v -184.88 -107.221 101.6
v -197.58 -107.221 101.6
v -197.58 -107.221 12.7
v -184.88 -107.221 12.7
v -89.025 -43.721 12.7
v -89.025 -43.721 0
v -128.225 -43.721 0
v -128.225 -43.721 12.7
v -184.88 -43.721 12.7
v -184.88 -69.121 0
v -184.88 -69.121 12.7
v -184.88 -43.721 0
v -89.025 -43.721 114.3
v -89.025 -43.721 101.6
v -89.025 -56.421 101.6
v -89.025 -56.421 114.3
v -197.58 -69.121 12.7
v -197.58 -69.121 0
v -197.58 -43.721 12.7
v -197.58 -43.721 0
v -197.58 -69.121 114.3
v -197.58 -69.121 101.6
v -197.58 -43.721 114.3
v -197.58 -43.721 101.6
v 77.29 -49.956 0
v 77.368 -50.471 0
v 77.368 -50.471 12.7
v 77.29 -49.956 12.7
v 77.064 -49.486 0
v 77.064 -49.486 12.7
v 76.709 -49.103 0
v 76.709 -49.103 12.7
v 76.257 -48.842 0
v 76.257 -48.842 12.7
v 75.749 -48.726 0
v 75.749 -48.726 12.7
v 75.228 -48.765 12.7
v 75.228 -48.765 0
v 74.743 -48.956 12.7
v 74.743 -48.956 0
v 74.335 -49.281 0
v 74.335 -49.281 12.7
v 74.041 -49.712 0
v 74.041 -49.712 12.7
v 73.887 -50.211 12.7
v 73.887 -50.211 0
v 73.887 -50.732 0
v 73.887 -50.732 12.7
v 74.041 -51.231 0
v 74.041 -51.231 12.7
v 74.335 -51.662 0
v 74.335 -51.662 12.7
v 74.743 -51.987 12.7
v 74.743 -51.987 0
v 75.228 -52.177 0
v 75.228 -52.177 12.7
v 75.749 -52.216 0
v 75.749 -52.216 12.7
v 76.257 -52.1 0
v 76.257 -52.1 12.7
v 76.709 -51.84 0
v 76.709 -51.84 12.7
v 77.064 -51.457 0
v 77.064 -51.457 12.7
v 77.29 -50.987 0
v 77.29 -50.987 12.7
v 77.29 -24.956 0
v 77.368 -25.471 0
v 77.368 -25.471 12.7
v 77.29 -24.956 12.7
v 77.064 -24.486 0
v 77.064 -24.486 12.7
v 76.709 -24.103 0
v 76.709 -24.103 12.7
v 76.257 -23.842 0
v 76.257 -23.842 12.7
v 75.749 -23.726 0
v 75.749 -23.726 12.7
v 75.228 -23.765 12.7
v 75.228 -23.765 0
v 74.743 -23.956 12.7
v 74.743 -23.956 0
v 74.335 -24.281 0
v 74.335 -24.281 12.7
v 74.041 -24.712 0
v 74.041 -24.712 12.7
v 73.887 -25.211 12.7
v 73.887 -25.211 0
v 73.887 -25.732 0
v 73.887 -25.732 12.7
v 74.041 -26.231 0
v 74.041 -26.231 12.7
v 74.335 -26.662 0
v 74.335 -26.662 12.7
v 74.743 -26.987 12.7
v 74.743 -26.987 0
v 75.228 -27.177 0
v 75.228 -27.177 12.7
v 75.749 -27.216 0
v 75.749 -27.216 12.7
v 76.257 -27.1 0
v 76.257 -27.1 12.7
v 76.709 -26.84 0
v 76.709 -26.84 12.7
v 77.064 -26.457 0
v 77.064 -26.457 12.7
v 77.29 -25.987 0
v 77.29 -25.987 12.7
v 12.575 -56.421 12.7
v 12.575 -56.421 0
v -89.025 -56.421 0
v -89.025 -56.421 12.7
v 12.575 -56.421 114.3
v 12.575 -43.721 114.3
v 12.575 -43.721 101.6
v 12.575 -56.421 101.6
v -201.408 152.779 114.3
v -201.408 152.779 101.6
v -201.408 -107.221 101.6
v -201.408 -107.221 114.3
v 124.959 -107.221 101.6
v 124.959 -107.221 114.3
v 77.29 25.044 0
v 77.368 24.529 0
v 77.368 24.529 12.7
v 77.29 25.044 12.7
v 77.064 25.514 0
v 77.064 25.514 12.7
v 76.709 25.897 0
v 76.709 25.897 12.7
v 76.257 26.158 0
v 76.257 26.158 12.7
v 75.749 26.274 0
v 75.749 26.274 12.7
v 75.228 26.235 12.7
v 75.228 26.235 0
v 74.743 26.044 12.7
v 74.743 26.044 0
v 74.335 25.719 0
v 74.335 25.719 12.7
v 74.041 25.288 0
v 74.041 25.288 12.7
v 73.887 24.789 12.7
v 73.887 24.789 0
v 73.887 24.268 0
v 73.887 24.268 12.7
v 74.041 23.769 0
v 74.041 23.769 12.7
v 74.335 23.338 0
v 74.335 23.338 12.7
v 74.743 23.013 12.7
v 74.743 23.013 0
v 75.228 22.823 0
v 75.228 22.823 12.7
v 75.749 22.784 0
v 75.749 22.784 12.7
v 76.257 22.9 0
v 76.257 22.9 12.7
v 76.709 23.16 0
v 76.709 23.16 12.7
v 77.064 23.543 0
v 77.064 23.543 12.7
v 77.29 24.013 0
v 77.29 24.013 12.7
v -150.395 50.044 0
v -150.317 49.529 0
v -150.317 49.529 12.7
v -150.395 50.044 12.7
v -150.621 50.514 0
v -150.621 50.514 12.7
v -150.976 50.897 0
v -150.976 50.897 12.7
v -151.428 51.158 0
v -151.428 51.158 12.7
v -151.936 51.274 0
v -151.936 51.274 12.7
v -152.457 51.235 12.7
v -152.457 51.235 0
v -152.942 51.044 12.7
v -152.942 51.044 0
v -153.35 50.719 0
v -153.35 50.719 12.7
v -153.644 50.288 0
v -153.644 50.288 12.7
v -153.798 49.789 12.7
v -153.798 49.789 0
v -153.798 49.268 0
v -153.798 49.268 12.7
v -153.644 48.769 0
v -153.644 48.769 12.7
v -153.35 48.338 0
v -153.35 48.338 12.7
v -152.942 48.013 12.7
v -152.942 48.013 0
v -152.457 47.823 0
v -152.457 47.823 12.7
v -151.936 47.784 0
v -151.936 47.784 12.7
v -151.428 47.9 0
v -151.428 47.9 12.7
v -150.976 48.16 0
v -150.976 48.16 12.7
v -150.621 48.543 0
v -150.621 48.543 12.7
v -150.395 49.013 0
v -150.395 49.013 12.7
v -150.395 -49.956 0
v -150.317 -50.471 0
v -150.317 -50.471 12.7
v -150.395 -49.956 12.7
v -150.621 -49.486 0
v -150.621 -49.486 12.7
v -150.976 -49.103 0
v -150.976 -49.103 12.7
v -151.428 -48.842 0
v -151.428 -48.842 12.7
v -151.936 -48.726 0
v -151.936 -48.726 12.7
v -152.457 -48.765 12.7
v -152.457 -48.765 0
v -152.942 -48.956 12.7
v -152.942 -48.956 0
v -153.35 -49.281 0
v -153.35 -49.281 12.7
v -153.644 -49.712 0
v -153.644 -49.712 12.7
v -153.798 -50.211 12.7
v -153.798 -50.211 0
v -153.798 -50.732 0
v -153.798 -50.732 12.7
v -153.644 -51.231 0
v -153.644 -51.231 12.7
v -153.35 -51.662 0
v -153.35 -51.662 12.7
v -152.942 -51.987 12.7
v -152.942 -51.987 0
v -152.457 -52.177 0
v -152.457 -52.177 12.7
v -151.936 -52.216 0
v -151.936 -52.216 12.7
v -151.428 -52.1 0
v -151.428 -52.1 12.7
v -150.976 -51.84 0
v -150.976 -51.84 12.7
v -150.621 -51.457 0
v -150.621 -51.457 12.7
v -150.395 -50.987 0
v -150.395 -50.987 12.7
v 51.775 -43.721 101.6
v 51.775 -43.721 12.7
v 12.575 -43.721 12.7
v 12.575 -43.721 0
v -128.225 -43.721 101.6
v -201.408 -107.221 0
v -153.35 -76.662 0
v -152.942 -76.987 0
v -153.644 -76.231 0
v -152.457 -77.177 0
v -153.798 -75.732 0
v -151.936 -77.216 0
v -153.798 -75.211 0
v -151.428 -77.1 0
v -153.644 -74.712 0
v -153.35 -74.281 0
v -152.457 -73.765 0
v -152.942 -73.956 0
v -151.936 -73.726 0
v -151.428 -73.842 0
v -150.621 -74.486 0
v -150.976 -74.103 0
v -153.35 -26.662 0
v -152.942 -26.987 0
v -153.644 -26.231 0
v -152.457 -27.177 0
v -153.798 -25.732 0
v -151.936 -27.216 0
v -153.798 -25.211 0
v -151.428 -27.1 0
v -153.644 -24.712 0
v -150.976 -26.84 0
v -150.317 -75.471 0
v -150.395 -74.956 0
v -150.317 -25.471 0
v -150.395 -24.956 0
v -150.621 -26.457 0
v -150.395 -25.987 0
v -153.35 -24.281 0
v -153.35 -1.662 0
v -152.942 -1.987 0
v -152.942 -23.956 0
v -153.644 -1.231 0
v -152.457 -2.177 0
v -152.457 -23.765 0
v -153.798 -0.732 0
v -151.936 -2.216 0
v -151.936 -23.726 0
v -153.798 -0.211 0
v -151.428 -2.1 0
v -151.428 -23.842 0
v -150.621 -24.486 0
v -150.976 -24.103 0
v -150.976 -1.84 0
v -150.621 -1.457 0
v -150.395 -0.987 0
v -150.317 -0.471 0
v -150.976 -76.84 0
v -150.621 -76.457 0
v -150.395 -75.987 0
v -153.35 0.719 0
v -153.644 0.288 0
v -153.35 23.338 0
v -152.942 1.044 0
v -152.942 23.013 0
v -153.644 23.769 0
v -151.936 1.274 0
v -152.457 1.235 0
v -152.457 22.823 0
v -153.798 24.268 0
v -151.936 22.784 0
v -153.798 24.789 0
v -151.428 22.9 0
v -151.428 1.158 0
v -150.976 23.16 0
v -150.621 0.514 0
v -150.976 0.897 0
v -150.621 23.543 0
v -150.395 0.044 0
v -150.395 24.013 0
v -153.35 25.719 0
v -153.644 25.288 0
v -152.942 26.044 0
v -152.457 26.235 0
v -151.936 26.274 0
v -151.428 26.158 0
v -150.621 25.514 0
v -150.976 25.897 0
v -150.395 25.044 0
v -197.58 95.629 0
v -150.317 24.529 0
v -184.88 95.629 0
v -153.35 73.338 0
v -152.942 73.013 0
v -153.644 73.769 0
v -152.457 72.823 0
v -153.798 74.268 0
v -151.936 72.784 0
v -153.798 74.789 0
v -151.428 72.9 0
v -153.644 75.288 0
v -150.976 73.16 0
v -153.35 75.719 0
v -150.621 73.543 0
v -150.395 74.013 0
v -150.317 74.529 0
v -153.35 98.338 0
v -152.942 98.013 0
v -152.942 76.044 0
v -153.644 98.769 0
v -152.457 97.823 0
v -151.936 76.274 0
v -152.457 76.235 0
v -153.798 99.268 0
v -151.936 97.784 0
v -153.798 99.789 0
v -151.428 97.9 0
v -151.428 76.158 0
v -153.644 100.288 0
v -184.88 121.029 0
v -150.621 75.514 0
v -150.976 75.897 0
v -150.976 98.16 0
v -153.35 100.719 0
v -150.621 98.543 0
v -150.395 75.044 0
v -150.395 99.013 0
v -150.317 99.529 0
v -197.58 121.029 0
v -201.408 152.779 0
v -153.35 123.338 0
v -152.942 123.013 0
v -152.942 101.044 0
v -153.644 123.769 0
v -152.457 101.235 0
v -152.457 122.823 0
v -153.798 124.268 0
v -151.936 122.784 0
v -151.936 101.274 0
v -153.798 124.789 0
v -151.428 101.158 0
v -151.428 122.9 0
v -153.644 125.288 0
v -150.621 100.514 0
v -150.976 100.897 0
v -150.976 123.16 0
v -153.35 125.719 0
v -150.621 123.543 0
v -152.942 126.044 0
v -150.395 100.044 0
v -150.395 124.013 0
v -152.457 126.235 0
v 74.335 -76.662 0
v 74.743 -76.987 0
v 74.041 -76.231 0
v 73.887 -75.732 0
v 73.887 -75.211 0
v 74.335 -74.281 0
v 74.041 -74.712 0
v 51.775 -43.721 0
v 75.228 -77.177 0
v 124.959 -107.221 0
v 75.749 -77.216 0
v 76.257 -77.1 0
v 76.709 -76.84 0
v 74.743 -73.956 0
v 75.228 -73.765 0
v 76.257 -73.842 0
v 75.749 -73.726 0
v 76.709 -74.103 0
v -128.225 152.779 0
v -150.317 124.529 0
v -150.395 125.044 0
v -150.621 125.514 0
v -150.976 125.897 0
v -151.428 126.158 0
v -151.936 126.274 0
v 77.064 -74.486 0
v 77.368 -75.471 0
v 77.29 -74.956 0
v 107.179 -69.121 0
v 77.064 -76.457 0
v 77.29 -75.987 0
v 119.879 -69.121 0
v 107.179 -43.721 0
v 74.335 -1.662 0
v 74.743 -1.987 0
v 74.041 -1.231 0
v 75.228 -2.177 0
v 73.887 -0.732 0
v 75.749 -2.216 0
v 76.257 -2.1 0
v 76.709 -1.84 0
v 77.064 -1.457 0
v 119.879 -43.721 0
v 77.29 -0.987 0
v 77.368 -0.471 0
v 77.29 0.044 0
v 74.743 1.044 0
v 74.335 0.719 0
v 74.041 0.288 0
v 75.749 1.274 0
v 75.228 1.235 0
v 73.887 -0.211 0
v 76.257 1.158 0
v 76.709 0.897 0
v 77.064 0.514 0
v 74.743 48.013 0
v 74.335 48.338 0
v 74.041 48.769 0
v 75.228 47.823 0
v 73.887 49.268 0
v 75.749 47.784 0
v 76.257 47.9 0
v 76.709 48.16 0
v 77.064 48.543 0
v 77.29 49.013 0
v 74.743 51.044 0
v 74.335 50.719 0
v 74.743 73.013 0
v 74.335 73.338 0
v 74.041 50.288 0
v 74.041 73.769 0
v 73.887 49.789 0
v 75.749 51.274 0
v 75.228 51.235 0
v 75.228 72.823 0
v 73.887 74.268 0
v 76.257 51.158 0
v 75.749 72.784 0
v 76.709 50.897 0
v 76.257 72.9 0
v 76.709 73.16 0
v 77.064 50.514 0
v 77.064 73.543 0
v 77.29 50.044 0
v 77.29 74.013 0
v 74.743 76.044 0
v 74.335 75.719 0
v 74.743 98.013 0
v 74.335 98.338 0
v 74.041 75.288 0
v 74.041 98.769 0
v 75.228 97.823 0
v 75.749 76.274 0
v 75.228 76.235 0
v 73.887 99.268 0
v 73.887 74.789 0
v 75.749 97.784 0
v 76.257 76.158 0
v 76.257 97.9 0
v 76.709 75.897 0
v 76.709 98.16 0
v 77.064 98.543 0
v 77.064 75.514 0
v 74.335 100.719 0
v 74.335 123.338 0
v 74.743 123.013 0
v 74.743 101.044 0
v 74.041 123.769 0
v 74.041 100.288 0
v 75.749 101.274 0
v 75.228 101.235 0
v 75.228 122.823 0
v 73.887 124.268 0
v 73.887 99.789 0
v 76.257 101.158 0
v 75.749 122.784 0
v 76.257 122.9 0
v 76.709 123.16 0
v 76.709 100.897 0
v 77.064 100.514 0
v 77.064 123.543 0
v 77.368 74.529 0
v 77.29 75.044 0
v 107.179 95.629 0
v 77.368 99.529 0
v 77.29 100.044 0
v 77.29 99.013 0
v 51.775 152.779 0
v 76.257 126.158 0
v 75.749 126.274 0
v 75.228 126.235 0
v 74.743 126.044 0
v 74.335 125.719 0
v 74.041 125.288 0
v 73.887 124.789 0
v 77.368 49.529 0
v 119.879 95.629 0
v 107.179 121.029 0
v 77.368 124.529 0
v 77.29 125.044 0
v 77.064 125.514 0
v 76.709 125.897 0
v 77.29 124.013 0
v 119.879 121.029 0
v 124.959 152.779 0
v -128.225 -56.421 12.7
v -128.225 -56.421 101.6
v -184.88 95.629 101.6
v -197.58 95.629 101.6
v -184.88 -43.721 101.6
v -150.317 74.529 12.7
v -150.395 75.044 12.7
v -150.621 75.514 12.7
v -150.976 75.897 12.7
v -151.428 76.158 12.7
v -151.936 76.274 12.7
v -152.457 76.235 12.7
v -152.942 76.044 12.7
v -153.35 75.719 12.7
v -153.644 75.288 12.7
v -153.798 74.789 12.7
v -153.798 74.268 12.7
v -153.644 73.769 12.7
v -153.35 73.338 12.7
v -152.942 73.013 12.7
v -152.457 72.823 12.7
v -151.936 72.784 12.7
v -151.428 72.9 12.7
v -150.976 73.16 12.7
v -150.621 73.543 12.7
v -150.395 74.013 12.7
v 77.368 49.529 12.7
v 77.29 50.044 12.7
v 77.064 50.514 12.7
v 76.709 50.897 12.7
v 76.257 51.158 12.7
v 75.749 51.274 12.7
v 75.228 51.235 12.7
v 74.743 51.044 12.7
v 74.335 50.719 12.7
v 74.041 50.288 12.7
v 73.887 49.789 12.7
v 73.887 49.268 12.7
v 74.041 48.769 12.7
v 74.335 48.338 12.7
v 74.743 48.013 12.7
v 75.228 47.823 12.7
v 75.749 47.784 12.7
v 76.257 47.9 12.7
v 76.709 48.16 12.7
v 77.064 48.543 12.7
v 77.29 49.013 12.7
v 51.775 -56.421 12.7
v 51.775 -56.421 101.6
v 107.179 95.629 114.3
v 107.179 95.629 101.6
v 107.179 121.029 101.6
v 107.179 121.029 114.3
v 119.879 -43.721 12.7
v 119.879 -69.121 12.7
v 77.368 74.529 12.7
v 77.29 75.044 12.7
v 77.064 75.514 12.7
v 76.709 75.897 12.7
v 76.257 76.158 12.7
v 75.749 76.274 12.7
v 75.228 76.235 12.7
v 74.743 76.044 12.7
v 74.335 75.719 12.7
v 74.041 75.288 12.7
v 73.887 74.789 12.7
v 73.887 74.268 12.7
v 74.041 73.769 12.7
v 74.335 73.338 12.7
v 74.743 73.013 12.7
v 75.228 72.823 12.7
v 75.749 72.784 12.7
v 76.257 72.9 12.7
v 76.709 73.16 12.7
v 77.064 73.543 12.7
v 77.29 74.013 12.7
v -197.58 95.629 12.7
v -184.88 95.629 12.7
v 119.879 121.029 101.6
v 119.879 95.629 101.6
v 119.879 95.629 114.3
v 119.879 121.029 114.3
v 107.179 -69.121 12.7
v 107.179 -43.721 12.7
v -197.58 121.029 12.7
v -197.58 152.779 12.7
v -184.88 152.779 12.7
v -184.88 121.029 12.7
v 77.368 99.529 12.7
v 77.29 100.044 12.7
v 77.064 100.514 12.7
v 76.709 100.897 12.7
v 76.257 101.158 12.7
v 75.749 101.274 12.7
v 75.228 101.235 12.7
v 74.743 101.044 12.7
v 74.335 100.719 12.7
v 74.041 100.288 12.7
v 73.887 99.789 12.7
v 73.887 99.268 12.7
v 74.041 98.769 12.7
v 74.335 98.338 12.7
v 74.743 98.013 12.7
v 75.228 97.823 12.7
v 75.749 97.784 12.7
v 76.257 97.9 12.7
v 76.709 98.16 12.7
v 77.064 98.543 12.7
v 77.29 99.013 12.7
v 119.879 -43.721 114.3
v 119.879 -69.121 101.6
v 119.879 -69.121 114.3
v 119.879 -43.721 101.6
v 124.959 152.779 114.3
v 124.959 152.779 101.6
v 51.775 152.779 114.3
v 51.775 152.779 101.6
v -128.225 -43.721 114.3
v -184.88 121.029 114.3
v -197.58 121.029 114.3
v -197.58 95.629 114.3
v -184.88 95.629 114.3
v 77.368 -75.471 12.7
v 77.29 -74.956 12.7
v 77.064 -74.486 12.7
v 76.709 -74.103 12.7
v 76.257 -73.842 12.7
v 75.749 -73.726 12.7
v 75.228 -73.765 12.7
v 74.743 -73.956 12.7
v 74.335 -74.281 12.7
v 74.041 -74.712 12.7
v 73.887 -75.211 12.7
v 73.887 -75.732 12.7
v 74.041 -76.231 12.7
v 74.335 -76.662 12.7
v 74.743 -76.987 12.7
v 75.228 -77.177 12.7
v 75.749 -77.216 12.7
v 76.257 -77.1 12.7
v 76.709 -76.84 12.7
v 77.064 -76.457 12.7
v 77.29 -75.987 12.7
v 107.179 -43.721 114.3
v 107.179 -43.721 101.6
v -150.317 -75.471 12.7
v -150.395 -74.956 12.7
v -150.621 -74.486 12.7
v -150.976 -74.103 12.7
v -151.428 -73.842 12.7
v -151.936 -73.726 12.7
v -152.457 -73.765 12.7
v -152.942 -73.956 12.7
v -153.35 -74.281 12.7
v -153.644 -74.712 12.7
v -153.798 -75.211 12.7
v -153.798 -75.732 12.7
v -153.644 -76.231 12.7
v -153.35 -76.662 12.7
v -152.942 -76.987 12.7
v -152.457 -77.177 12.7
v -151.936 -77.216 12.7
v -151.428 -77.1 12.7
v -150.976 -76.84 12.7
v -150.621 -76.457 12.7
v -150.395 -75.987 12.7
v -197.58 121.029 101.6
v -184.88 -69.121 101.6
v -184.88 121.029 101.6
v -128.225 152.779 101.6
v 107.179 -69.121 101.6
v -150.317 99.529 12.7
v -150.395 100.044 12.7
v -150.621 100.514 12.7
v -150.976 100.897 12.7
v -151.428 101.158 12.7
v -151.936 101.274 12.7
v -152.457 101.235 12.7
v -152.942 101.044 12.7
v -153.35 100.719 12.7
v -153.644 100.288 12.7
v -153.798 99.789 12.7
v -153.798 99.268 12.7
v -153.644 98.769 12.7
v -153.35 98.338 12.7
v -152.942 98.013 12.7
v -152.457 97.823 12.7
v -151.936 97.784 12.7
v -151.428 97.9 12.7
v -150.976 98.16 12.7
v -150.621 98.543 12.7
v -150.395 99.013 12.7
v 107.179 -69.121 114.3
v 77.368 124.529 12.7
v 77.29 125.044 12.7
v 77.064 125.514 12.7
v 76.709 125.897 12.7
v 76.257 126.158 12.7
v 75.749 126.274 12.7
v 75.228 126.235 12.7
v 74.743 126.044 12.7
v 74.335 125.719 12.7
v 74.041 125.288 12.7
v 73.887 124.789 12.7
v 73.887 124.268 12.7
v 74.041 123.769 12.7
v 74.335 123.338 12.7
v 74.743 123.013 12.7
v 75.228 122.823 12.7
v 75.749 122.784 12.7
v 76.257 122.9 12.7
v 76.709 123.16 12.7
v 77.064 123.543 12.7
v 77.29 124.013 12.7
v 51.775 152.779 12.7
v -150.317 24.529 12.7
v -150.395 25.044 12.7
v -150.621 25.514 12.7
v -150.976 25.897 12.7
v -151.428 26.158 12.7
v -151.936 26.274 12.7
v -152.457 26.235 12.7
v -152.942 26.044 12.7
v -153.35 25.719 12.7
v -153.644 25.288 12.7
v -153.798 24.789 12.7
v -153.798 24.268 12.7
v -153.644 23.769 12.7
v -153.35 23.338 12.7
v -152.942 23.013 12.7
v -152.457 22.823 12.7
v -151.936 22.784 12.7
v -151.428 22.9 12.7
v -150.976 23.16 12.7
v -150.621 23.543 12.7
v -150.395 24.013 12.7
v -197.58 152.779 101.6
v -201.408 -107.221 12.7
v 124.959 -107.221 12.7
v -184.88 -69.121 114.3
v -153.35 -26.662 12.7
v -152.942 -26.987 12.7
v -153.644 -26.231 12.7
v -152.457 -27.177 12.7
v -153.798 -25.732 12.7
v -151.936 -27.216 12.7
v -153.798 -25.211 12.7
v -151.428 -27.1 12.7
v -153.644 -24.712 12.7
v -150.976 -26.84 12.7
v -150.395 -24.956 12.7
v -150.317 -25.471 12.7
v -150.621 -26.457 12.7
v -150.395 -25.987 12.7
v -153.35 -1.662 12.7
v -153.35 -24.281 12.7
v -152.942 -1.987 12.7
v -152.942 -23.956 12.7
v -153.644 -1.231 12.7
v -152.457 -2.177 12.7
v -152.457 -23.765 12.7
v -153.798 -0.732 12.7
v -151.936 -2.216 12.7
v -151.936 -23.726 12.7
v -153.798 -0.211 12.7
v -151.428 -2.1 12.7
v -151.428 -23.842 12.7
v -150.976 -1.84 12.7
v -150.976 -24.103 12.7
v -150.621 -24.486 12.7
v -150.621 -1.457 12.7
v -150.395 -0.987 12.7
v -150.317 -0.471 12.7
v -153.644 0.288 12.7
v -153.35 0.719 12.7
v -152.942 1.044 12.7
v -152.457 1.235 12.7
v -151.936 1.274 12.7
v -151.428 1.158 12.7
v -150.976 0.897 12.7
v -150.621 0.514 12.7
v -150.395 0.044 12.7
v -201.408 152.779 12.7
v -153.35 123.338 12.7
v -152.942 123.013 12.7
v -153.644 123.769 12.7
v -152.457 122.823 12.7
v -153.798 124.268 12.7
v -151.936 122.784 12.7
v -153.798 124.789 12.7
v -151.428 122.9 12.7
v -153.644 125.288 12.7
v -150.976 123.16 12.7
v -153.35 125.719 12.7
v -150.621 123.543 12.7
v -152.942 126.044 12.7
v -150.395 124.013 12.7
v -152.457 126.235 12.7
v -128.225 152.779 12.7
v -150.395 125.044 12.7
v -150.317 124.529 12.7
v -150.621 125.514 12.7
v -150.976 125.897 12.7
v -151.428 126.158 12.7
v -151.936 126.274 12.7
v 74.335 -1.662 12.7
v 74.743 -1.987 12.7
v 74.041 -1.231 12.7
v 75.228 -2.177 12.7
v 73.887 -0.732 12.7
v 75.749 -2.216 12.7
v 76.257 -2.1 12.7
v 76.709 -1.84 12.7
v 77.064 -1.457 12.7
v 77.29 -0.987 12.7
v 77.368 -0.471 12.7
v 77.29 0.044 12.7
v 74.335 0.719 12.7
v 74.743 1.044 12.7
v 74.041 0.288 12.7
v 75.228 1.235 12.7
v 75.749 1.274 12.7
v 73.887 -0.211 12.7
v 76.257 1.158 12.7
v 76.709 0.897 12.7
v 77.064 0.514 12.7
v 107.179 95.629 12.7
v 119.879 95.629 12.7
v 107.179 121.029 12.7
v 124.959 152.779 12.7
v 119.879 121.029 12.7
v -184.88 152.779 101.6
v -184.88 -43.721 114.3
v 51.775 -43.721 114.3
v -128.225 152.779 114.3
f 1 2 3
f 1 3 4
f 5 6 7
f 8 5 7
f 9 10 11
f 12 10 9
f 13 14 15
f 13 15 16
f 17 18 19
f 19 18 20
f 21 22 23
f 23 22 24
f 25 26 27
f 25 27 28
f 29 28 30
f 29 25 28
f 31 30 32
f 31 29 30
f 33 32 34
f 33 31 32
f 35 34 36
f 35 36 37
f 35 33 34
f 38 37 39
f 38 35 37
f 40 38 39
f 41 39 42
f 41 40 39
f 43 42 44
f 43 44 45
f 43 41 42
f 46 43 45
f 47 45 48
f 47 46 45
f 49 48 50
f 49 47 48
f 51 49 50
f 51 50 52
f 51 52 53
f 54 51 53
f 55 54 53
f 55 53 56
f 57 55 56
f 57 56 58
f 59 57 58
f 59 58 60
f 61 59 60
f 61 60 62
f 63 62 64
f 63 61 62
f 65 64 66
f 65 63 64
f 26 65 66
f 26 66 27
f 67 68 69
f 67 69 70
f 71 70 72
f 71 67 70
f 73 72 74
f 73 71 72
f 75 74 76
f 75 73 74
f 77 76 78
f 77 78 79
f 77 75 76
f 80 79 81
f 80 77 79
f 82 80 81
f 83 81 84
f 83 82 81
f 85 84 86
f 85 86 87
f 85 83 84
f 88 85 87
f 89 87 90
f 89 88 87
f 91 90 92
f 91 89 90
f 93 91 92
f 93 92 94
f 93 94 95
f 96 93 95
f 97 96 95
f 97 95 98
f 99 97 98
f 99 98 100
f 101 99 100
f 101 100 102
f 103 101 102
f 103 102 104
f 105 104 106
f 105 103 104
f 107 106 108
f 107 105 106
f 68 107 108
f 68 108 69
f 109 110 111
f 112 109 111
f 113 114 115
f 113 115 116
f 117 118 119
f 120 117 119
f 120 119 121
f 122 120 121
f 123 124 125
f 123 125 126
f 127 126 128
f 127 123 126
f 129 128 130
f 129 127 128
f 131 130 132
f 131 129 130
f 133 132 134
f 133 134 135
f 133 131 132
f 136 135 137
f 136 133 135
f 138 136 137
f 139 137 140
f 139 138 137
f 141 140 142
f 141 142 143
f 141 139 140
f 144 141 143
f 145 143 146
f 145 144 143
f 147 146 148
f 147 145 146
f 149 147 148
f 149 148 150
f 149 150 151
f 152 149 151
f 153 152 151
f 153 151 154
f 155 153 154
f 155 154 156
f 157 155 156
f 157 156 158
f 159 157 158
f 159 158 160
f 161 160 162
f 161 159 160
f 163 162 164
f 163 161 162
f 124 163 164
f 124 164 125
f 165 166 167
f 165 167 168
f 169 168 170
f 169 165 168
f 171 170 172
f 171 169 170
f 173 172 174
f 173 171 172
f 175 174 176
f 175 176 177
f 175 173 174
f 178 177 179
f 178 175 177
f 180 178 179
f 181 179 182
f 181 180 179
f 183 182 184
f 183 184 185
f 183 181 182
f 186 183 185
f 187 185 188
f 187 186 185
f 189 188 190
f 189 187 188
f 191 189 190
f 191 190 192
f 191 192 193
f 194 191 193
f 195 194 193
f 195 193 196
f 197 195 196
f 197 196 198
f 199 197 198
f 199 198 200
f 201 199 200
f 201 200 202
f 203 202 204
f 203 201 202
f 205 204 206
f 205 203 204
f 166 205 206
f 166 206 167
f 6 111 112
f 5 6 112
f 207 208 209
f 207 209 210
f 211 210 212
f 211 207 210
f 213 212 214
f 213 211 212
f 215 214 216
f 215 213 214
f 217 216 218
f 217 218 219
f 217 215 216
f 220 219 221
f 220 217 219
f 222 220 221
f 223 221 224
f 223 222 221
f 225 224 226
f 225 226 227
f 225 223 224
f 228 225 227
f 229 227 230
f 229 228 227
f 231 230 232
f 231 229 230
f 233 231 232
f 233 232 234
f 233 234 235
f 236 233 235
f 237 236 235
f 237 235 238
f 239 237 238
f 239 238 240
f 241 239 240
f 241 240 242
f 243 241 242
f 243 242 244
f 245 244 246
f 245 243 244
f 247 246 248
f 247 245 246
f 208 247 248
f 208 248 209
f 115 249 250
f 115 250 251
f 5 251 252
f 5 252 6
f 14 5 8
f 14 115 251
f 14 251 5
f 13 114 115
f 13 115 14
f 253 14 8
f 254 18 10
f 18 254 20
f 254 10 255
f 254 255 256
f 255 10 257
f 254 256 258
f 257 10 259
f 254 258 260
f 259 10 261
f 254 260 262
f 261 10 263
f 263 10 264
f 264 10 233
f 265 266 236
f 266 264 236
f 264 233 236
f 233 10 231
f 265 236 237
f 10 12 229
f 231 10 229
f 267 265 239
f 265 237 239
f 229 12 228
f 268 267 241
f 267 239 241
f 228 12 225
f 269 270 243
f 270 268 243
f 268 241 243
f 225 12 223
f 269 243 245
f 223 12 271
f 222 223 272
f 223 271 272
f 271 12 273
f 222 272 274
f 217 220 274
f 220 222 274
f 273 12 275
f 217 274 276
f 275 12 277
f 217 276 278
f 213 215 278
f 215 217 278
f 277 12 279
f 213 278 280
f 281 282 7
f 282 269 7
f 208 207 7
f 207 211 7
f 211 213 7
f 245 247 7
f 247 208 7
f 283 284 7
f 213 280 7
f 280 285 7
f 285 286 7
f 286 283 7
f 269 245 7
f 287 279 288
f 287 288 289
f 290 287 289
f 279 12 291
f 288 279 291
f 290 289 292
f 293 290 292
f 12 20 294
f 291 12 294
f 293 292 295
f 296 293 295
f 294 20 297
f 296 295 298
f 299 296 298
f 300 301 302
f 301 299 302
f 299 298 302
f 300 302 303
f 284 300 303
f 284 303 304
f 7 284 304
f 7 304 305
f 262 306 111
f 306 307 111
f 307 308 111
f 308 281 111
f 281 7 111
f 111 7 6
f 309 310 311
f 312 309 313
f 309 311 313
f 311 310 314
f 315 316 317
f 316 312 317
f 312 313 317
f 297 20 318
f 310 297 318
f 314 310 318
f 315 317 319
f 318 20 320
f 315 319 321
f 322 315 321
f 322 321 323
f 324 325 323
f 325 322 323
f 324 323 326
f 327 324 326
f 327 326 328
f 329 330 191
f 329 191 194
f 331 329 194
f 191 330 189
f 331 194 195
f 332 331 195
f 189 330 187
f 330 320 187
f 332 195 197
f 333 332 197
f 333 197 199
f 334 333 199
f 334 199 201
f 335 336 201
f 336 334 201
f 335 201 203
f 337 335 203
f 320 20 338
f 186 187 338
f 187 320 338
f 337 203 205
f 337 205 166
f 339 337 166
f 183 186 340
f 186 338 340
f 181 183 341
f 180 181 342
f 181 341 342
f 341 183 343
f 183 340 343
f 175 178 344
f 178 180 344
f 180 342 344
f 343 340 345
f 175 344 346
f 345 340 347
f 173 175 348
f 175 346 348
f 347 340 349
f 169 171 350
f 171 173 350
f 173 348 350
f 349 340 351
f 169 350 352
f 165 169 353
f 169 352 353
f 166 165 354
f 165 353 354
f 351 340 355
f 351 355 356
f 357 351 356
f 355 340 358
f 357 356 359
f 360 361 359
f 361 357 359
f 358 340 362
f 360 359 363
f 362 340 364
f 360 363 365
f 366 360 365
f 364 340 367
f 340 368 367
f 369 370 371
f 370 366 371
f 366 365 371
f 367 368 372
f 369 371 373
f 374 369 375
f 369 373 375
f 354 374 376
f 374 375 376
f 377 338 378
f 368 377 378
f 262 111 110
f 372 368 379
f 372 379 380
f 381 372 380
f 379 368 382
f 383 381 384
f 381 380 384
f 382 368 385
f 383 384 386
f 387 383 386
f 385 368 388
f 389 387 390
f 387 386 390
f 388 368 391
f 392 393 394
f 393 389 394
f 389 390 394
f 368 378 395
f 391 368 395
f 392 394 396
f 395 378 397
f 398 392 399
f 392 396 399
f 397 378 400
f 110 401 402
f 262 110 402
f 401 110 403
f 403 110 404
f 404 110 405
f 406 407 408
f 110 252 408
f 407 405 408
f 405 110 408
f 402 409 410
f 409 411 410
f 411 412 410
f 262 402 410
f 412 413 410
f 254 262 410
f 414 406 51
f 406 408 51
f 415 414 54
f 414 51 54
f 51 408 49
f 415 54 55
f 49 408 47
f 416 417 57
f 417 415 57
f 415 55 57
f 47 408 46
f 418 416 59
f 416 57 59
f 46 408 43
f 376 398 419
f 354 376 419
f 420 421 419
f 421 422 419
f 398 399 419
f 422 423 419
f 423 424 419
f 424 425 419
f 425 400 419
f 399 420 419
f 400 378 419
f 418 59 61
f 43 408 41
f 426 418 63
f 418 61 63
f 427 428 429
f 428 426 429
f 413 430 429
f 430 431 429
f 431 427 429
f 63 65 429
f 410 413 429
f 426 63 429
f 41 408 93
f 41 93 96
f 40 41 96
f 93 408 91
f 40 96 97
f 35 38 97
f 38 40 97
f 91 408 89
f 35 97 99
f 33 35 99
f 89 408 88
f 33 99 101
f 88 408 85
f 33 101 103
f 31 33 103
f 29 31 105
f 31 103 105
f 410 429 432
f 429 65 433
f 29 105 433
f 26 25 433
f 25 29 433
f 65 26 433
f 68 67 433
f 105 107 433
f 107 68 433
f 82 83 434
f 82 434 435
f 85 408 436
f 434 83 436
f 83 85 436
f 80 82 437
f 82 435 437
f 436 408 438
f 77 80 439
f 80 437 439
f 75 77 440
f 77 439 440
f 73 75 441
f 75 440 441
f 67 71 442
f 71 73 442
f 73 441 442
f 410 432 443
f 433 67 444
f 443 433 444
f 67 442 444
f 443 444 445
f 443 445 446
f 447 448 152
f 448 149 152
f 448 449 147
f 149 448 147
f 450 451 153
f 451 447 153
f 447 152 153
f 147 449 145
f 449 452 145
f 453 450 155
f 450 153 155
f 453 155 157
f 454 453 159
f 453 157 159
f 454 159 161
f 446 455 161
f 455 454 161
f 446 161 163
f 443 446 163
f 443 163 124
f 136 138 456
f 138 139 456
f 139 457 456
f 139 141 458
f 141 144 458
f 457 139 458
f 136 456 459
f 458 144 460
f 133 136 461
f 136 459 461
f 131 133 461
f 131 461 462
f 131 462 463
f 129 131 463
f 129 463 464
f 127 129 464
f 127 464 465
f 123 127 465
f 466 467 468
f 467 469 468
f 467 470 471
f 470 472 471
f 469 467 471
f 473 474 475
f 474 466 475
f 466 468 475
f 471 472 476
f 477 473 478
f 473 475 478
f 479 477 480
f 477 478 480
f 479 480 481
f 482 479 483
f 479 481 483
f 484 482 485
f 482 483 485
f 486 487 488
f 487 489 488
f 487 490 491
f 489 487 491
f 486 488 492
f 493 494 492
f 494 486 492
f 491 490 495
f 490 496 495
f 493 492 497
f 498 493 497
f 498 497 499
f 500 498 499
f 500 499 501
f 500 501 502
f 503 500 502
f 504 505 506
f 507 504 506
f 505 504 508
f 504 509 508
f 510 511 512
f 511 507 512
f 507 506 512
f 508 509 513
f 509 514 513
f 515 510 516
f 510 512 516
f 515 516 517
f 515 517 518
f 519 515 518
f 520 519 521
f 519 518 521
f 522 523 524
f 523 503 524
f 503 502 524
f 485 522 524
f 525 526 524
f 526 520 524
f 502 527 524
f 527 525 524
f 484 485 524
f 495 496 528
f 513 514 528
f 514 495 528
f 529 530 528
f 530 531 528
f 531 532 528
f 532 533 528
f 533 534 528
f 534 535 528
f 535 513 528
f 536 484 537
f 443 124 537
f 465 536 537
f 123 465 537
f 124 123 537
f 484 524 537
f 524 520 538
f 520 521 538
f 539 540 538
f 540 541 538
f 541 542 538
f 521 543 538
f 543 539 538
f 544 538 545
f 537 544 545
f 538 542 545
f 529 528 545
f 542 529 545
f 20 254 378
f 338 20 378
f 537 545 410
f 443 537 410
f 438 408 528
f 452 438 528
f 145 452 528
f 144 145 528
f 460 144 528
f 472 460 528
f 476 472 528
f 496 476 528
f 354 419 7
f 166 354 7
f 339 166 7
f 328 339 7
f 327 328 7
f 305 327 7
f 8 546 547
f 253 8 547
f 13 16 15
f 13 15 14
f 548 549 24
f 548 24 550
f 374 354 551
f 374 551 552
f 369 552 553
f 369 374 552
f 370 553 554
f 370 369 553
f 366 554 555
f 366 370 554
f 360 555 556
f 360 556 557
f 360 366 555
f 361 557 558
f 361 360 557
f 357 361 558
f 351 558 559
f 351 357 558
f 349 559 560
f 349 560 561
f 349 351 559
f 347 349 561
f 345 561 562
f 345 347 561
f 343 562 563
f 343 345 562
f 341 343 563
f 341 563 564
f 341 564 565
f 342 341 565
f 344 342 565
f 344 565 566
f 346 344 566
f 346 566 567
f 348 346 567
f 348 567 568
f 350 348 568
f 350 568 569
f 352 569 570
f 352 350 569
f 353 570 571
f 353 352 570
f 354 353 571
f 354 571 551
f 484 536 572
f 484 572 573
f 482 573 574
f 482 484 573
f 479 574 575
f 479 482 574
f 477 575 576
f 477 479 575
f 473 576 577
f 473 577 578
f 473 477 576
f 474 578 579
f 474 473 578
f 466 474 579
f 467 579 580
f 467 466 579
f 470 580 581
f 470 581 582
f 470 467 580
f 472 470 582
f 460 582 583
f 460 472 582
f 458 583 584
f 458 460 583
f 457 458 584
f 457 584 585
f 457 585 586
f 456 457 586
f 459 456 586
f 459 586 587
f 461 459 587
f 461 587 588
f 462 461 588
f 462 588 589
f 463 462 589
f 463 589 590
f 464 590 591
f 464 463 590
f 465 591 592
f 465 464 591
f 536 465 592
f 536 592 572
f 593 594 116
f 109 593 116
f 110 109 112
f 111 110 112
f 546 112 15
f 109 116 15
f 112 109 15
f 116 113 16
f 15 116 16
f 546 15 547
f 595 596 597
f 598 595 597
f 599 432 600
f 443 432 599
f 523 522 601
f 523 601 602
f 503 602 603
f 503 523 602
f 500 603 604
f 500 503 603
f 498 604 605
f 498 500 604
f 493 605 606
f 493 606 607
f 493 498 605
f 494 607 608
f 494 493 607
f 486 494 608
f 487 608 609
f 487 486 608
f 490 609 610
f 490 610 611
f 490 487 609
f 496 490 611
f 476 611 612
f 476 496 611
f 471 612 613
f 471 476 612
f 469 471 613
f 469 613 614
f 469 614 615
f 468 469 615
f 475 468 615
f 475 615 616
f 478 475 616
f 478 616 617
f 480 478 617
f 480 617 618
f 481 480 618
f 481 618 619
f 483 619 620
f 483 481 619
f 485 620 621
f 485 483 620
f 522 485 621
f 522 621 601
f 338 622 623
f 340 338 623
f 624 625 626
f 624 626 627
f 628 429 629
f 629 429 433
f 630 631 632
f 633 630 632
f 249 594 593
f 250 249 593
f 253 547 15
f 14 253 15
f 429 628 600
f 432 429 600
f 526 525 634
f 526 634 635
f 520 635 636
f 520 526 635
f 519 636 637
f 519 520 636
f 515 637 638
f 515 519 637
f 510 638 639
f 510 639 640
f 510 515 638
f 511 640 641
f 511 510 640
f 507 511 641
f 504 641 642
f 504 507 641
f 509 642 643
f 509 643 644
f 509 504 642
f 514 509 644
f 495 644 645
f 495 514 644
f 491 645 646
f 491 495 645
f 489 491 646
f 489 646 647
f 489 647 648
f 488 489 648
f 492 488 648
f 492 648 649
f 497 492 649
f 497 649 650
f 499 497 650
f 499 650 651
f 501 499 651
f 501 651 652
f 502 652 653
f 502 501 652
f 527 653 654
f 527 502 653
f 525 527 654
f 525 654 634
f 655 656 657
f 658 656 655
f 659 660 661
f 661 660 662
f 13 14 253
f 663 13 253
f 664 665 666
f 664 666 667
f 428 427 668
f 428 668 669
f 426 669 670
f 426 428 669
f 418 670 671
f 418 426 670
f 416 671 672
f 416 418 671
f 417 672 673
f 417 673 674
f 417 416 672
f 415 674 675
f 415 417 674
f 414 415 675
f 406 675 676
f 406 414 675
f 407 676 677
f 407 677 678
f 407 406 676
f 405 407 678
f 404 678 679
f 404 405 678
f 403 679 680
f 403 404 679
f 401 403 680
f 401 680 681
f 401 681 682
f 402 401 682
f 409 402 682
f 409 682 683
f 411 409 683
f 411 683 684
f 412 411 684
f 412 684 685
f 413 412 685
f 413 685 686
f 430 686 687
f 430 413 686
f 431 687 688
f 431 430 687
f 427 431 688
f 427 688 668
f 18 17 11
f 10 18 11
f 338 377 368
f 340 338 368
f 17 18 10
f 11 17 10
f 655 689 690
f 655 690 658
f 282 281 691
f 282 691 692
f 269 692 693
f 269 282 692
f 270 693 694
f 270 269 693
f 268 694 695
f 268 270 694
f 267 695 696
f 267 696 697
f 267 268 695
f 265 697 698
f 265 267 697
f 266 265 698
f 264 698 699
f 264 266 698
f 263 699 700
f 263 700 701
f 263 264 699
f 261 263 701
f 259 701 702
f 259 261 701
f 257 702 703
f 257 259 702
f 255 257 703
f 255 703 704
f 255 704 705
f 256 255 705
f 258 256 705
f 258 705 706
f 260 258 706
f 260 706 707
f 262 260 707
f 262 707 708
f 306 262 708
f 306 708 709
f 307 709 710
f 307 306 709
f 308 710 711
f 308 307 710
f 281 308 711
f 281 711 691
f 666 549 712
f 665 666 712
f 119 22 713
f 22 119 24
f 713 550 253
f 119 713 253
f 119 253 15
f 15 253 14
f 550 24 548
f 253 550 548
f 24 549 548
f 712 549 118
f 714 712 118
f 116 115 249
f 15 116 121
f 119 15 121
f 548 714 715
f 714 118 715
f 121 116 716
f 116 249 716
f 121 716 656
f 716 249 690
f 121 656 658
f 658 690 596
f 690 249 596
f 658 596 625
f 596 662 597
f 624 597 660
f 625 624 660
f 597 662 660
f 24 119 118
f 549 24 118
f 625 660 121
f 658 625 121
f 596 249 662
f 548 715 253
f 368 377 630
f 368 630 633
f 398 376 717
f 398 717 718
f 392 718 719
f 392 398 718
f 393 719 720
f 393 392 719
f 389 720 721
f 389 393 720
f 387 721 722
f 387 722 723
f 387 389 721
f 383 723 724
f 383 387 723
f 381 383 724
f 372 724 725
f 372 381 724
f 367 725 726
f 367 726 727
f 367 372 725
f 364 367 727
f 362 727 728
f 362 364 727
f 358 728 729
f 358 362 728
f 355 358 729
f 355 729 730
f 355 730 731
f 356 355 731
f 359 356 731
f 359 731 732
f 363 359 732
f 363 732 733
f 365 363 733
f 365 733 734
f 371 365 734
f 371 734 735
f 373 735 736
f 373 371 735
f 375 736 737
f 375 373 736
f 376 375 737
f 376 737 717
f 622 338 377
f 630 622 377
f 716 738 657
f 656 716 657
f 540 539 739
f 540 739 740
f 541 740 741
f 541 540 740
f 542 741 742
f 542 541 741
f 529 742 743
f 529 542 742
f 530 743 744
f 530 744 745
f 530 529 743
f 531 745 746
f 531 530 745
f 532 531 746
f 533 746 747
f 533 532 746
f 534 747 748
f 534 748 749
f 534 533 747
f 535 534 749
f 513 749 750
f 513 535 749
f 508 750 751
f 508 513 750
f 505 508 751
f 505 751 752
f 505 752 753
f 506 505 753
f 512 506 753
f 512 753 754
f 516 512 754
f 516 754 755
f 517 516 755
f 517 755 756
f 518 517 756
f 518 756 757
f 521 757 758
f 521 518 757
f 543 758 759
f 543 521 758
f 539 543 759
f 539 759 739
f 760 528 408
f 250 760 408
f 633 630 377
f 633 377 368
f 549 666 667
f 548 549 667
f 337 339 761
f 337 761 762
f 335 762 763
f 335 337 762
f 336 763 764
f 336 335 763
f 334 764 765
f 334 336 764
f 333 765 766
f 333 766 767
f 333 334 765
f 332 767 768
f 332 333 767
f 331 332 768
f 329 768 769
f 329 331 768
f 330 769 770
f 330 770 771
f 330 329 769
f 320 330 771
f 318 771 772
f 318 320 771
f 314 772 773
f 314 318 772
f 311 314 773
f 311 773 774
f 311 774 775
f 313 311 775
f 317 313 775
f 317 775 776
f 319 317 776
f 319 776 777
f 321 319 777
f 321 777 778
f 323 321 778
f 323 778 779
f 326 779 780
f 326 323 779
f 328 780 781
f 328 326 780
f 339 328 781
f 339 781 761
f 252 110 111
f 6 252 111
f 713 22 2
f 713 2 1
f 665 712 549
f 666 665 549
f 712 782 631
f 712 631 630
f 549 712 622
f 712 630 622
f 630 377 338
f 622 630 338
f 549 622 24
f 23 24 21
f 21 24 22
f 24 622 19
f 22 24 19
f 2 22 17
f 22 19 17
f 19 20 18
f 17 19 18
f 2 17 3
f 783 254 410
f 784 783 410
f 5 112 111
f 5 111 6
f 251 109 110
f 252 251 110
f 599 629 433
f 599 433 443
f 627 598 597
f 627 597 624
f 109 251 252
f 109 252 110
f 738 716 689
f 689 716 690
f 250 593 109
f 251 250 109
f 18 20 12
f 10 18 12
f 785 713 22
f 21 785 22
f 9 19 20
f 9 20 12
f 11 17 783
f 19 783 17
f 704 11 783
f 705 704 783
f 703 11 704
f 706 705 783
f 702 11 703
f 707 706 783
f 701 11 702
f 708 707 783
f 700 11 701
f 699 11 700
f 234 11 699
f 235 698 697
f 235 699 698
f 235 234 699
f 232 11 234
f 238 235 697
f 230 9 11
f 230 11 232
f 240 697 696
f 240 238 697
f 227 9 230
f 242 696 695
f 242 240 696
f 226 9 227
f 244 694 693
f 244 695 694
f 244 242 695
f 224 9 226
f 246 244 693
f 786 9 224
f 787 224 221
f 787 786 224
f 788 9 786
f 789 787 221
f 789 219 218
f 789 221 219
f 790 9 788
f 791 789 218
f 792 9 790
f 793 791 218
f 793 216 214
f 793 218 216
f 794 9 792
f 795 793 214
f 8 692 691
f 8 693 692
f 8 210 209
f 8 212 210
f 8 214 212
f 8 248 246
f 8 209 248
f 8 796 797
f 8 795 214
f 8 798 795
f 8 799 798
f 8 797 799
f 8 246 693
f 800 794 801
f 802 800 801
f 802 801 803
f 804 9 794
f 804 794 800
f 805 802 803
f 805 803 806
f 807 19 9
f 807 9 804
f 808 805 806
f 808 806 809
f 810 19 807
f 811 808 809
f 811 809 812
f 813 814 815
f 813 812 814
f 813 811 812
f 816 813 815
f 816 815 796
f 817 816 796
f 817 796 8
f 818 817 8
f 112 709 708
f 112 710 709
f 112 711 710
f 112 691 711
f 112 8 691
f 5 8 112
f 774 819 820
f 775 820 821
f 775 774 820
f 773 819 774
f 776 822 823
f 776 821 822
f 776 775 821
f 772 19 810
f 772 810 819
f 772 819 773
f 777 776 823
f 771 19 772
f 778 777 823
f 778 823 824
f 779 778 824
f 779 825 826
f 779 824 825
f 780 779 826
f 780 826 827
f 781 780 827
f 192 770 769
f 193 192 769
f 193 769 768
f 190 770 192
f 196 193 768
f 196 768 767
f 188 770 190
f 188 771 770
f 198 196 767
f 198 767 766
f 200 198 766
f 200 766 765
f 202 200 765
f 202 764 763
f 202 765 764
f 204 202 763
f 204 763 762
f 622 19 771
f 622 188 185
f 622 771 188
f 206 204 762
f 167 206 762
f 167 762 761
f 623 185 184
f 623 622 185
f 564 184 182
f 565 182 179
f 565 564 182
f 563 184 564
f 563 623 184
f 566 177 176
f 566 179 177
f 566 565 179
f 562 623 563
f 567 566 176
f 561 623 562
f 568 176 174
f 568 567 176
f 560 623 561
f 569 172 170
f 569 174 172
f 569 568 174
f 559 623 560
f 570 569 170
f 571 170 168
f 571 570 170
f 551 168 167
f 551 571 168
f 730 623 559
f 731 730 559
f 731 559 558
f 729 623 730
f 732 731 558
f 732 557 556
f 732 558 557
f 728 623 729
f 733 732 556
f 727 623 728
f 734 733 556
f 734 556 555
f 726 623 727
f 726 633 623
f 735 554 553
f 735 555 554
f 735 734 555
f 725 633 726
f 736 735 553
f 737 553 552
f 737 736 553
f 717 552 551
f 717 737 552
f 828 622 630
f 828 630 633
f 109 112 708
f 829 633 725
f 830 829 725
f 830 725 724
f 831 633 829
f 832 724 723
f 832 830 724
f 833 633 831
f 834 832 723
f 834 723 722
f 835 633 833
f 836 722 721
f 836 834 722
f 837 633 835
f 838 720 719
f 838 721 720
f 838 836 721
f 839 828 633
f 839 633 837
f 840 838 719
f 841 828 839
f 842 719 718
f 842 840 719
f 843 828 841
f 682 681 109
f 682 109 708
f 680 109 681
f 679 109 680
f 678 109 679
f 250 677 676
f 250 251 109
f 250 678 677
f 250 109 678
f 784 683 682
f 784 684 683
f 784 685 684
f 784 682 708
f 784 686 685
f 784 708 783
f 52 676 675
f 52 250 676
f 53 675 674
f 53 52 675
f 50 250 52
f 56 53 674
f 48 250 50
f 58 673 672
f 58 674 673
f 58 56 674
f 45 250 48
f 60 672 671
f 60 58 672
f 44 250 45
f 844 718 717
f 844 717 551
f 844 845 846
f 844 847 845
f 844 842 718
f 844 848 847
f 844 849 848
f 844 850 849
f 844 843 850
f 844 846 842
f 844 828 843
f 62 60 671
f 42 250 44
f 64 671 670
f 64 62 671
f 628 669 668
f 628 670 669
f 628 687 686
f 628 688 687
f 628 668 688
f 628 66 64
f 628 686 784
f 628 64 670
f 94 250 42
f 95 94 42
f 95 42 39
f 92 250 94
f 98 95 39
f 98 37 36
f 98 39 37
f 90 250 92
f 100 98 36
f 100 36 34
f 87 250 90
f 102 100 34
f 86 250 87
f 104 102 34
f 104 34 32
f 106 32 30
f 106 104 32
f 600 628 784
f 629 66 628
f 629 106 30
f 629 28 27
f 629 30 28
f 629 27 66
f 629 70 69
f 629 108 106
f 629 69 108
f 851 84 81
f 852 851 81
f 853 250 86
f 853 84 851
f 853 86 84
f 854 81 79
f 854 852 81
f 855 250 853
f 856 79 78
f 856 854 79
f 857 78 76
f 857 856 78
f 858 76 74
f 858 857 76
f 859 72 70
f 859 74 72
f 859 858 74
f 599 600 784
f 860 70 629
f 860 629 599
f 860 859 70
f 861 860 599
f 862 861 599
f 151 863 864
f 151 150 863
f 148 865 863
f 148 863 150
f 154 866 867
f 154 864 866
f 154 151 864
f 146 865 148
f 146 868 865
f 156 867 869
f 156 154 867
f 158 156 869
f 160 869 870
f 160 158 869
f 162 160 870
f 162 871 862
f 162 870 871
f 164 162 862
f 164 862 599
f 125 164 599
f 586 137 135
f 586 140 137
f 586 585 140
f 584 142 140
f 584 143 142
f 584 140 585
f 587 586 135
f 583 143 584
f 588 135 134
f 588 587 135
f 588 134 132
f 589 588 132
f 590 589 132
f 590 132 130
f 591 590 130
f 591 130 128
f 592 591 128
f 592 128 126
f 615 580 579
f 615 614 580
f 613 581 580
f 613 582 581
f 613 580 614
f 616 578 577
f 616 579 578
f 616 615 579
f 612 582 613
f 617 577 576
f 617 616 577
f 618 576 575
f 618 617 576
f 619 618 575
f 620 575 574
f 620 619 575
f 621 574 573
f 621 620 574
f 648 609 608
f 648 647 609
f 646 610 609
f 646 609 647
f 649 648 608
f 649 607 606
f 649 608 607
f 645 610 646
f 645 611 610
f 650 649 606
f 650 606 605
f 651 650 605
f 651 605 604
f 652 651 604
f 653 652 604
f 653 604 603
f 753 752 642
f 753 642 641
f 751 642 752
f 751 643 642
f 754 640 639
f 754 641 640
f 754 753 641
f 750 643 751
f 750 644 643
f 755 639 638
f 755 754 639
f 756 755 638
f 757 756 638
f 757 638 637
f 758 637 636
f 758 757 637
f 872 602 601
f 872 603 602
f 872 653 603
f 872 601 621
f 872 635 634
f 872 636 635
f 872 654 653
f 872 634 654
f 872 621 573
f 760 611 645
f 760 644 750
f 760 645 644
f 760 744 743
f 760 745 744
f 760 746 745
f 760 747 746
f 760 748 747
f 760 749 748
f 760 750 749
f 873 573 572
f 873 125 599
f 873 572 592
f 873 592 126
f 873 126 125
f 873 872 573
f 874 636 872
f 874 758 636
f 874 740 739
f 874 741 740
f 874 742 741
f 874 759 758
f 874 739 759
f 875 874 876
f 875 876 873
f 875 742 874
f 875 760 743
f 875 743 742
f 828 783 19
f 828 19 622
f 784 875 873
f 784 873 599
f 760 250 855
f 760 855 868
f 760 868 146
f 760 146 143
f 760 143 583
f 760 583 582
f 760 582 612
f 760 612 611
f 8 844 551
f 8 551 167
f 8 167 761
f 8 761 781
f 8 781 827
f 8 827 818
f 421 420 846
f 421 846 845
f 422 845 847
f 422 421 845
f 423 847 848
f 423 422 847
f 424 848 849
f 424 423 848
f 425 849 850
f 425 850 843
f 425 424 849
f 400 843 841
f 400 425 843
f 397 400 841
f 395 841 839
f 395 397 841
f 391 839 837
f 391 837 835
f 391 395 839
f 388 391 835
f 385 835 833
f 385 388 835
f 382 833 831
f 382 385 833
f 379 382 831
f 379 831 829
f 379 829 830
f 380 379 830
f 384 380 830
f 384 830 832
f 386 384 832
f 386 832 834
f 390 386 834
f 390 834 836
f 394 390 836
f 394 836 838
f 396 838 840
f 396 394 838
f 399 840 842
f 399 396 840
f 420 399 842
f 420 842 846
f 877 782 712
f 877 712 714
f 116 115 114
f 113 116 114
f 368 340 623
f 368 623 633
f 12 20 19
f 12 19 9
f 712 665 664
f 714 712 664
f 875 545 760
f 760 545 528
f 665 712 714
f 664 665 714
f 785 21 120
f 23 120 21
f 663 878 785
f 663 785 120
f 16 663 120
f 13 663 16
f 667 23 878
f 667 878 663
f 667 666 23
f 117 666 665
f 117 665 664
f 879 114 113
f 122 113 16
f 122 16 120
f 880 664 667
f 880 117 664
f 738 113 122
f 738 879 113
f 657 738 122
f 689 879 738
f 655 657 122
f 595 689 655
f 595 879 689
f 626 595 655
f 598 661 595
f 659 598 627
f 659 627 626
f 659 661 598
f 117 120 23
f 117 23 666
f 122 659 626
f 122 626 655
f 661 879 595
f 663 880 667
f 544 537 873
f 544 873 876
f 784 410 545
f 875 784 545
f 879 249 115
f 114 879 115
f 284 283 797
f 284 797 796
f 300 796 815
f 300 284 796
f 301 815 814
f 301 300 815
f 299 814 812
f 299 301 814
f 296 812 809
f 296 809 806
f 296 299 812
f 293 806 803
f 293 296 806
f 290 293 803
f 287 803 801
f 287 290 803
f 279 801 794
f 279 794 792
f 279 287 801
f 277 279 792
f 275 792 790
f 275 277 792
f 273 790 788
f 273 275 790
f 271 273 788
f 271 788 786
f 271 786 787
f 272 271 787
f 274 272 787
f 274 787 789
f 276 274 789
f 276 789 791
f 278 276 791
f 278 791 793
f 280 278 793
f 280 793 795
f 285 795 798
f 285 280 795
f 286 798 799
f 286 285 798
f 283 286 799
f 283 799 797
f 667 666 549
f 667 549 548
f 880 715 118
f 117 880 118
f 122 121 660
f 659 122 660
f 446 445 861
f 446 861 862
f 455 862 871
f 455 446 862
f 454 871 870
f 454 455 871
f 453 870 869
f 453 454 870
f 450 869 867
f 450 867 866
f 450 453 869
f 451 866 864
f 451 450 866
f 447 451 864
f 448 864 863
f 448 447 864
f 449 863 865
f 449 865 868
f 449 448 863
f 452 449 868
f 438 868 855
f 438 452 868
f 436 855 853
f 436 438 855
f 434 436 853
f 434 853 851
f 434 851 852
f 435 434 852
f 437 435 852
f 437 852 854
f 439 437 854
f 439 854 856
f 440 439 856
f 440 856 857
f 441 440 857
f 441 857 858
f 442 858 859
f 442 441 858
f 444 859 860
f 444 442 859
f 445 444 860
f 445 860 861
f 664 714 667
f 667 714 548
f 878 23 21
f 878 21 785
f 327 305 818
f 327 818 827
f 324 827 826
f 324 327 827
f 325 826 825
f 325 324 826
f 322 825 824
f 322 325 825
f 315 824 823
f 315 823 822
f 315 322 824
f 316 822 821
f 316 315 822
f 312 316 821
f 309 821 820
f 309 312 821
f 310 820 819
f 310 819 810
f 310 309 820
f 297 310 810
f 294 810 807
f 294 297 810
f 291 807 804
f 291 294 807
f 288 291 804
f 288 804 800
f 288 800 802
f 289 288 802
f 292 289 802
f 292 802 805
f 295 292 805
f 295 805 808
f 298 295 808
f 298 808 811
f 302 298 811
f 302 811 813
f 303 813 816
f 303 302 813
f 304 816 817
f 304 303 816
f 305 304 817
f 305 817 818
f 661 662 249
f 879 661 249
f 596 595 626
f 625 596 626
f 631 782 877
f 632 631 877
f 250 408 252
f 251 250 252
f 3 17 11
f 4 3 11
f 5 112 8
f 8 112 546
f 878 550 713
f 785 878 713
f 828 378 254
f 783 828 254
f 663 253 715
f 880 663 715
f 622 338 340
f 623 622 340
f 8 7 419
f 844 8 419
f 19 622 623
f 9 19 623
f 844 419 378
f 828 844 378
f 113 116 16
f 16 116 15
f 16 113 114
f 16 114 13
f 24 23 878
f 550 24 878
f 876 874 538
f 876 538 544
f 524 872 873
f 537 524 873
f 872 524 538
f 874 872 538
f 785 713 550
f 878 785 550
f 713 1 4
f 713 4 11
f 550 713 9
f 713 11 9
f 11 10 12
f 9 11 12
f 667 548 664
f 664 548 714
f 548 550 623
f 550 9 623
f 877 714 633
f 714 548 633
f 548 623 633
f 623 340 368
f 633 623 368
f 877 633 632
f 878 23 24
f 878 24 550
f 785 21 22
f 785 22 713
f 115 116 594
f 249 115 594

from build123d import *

# Parameters (mm, degrees)
F1_R      = 1.75
F1_W      = 12.7
F1_H      = 25.4
F2_DEPTH  = 12.7
F3_W      = 12.7
F3_H      = 139.35
F3_H_2    = 38.1
F3_H_3    = 25.4
F3_H_4    = 31.75
F4_DEPTH  = 88.9
F5_DEPTH  = 12.7
F6_W      = 12.7
F6_H      = 25.4
F6_H_2    = 139.35
F7_DEPTH  = 12.7
F9_W      = 101.6
F9_H      = 12.7
F10_DEPTH = 12.7


# Not quite as in the source:
# - a feature of the source that left no trace in its solid (it failed there, or was rolled back) is left out
# - a pattern or mirror of a feature is missing from the dataset's text; its kind, count and spacing are read off the source's solid


with BuildPart() as f2:
    # F1 (on Top) → F2 (new body)
    with BuildSketch(Plane.XY):
        Polygon((-128.2246859372, 152.7786509395), (-201.4082543561, 152.7786509395), (-201.4082543561, -107.2213490605), (124.9588824817, -107.2213490605), (124.9588824817, 152.7786509395), (51.7753140628, 152.7786509395), (51.7753140628, -43.7213490605), (12.5753140628, -43.7213490605), (12.5753140628, -56.4213490605), (-89.0246859372, -56.4213490605), (-89.0246859372, -43.7213490605), (-128.2246859372, -43.7213490605), align=None)
        with Locations((-152.0671993494, -75.4713490605)):
            Circle(F1_R, mode=Mode.SUBTRACT)
        with Locations((-191.2300288677, -56.4213490605)):
            Rectangle(F1_W, F1_H, mode=Mode.SUBTRACT)
        with Locations((-152.0671993494, -50.4713490605)):
            Circle(F1_R, mode=Mode.SUBTRACT)
        with Locations((-152.0671993494, -25.4713490605)):
            Circle(F1_R, mode=Mode.SUBTRACT)
        with Locations((-152.0671993494, -0.4713490605)):
            Circle(F1_R, mode=Mode.SUBTRACT)
        with Locations((75.6178274751, -75.4713490605)):
            Circle(F1_R, mode=Mode.SUBTRACT)
        with Locations((75.6178274751, -50.4713490605)):
            Circle(F1_R, mode=Mode.SUBTRACT)
        with Locations((113.5288824817, -56.4213490605)):
            Rectangle(F1_W, F1_H, mode=Mode.SUBTRACT)
        with Locations((75.6178274751, -25.4713490605)):
            Circle(F1_R, mode=Mode.SUBTRACT)
        with Locations((75.6178274751, -0.4713490605)):
            Circle(F1_R, mode=Mode.SUBTRACT)
        with Locations((-152.0671993494, 24.5286509395)):
            Circle(F1_R, mode=Mode.SUBTRACT)
        with Locations((-152.0671993494, 49.5286509395)):
            Circle(F1_R, mode=Mode.SUBTRACT)
        with Locations((-152.0671993494, 74.5286509395)):
            Circle(F1_R, mode=Mode.SUBTRACT)
        with Locations((-191.2300288677, 108.3286509395)):
            Rectangle(F1_W, F1_H, mode=Mode.SUBTRACT)
        with Locations((-152.0671993494, 99.5286509395)):
            Circle(F1_R, mode=Mode.SUBTRACT)
        with Locations((-152.0671993494, 124.5286509395)):
            Circle(F1_R, mode=Mode.SUBTRACT)
        with Locations((75.6178274751, 24.5286509395)):
            Circle(F1_R, mode=Mode.SUBTRACT)
        with Locations((75.6178274751, 49.5286509395)):
            Circle(F1_R, mode=Mode.SUBTRACT)
        with Locations((75.6178274751, 74.5286509395)):
            Circle(F1_R, mode=Mode.SUBTRACT)
        with Locations((75.6178274751, 99.5286509395)):
            Circle(F1_R, mode=Mode.SUBTRACT)
        with Locations((113.5288824817, 108.3286509395)):
            Rectangle(F1_W, F1_H, mode=Mode.SUBTRACT)
        with Locations((75.6178274751, 124.5286509395)):
            Circle(F1_R, mode=Mode.SUBTRACT)
    extrude(amount=F2_DEPTH)


with BuildPart() as f4:
    # F3 (on face) → F4 (new body)
    with BuildSketch(Plane.XY.offset(12.7)):
        with Locations((-191.2300288677, 25.9536509395)):
            Rectangle(F3_W, F3_H)
        with Locations((-191.2300288677, -88.1713490605)):
            Rectangle(F3_W, F3_H_2)
        with Locations((-191.2300288677, 108.3286509395)):
            Rectangle(F3_W, F3_H_3)
        with Locations((-191.2300288677, 136.9036509395)):
            Rectangle(F3_W, F3_H_4)
        with Locations((-191.2300288677, -56.4213490605)):
            Rectangle(F3_W, F3_H_3)
    extrude(amount=F4_DEPTH)

    # F3 (on face) → F5 (join, through all)
    with BuildSketch(Plane.XY.offset(12.7)):
        with Locations((-191.2300288677, -56.4213490605)):
            Rectangle(F3_W, F3_H_3)
        with Locations((-191.2300288677, 108.3286509395)):
            Rectangle(F3_W, F3_H_3)
    f5 = extrude(amount=-F5_DEPTH)

    # F5_copies: F5 across plane
    add(f5.mirror(Plane.XY.offset(57.15)))


with BuildPart() as f7:
    # F6 (on face) → F7 (new body)
    with BuildSketch(Plane.XY.offset(101.6)):
        Polygon((-128.2246859372, 152.7786509395), (-201.4082543561, 152.7786509395), (-201.4082543561, -107.2213490605), (124.9588824817, -107.2213490605), (124.9588824817, 152.7786509395), (51.7753140628, 152.7786509395), (51.7753140628, -43.7213490605), (12.5753140628, -43.7213490605), (12.5753140628, -56.4213490605), (-89.0246859372, -56.4213490605), (-89.0246859372, -43.7213490605), (-128.2246859372, -43.7213490605), align=None)
        with Locations((113.5288824817, -56.4213490605)):
            Rectangle(F6_W, F6_H, mode=Mode.SUBTRACT)
        Polygon((-197.5800288677, -43.7213490605), (-197.5800288677, 95.6286509395), (-197.5800288677, 121.0286509395), (-184.8800288677, 121.0286509395), (-184.8800288677, 95.6286509395), (-184.8800288677, -43.7213490605), (-184.8800288677, -69.1213490605), (-197.5800288677, -69.1213490605), align=None, mode=Mode.SUBTRACT)
        with Locations((113.5288824817, 108.3286509395)):
            Rectangle(F6_W, F6_H, mode=Mode.SUBTRACT)
        with Locations((-191.2300288677, 25.9536509395)):
            Rectangle(F6_W, F6_H_2)
    extrude(amount=F7_DEPTH)


with BuildPart() as f10:
    # F9 (on face) → F10 (new body, through all)
    with BuildSketch(Plane(origin=(0, -56.4213490605, 0), x_dir=(-1, 0, 0), z_dir=(0, 1, 0))):
        Polygon((89.0246859372, 101.6), (-12.5753140628, 101.6), (-51.7753140628, 101.6), (-51.7753140628, 12.7), (-12.5753140628, 12.7), (-12.5753140628, 0), (89.0246859372, 0), (89.0246859372, 12.7), (128.2246859372, 12.7), (128.2246859372, 101.6), align=None)
        with Locations((38.2246859372, 107.95)):
            Rectangle(F9_W, F9_H)
    extrude(amount=F10_DEPTH)


solid = Compound([f2.part, f4.part, f7.part, f10.part])
